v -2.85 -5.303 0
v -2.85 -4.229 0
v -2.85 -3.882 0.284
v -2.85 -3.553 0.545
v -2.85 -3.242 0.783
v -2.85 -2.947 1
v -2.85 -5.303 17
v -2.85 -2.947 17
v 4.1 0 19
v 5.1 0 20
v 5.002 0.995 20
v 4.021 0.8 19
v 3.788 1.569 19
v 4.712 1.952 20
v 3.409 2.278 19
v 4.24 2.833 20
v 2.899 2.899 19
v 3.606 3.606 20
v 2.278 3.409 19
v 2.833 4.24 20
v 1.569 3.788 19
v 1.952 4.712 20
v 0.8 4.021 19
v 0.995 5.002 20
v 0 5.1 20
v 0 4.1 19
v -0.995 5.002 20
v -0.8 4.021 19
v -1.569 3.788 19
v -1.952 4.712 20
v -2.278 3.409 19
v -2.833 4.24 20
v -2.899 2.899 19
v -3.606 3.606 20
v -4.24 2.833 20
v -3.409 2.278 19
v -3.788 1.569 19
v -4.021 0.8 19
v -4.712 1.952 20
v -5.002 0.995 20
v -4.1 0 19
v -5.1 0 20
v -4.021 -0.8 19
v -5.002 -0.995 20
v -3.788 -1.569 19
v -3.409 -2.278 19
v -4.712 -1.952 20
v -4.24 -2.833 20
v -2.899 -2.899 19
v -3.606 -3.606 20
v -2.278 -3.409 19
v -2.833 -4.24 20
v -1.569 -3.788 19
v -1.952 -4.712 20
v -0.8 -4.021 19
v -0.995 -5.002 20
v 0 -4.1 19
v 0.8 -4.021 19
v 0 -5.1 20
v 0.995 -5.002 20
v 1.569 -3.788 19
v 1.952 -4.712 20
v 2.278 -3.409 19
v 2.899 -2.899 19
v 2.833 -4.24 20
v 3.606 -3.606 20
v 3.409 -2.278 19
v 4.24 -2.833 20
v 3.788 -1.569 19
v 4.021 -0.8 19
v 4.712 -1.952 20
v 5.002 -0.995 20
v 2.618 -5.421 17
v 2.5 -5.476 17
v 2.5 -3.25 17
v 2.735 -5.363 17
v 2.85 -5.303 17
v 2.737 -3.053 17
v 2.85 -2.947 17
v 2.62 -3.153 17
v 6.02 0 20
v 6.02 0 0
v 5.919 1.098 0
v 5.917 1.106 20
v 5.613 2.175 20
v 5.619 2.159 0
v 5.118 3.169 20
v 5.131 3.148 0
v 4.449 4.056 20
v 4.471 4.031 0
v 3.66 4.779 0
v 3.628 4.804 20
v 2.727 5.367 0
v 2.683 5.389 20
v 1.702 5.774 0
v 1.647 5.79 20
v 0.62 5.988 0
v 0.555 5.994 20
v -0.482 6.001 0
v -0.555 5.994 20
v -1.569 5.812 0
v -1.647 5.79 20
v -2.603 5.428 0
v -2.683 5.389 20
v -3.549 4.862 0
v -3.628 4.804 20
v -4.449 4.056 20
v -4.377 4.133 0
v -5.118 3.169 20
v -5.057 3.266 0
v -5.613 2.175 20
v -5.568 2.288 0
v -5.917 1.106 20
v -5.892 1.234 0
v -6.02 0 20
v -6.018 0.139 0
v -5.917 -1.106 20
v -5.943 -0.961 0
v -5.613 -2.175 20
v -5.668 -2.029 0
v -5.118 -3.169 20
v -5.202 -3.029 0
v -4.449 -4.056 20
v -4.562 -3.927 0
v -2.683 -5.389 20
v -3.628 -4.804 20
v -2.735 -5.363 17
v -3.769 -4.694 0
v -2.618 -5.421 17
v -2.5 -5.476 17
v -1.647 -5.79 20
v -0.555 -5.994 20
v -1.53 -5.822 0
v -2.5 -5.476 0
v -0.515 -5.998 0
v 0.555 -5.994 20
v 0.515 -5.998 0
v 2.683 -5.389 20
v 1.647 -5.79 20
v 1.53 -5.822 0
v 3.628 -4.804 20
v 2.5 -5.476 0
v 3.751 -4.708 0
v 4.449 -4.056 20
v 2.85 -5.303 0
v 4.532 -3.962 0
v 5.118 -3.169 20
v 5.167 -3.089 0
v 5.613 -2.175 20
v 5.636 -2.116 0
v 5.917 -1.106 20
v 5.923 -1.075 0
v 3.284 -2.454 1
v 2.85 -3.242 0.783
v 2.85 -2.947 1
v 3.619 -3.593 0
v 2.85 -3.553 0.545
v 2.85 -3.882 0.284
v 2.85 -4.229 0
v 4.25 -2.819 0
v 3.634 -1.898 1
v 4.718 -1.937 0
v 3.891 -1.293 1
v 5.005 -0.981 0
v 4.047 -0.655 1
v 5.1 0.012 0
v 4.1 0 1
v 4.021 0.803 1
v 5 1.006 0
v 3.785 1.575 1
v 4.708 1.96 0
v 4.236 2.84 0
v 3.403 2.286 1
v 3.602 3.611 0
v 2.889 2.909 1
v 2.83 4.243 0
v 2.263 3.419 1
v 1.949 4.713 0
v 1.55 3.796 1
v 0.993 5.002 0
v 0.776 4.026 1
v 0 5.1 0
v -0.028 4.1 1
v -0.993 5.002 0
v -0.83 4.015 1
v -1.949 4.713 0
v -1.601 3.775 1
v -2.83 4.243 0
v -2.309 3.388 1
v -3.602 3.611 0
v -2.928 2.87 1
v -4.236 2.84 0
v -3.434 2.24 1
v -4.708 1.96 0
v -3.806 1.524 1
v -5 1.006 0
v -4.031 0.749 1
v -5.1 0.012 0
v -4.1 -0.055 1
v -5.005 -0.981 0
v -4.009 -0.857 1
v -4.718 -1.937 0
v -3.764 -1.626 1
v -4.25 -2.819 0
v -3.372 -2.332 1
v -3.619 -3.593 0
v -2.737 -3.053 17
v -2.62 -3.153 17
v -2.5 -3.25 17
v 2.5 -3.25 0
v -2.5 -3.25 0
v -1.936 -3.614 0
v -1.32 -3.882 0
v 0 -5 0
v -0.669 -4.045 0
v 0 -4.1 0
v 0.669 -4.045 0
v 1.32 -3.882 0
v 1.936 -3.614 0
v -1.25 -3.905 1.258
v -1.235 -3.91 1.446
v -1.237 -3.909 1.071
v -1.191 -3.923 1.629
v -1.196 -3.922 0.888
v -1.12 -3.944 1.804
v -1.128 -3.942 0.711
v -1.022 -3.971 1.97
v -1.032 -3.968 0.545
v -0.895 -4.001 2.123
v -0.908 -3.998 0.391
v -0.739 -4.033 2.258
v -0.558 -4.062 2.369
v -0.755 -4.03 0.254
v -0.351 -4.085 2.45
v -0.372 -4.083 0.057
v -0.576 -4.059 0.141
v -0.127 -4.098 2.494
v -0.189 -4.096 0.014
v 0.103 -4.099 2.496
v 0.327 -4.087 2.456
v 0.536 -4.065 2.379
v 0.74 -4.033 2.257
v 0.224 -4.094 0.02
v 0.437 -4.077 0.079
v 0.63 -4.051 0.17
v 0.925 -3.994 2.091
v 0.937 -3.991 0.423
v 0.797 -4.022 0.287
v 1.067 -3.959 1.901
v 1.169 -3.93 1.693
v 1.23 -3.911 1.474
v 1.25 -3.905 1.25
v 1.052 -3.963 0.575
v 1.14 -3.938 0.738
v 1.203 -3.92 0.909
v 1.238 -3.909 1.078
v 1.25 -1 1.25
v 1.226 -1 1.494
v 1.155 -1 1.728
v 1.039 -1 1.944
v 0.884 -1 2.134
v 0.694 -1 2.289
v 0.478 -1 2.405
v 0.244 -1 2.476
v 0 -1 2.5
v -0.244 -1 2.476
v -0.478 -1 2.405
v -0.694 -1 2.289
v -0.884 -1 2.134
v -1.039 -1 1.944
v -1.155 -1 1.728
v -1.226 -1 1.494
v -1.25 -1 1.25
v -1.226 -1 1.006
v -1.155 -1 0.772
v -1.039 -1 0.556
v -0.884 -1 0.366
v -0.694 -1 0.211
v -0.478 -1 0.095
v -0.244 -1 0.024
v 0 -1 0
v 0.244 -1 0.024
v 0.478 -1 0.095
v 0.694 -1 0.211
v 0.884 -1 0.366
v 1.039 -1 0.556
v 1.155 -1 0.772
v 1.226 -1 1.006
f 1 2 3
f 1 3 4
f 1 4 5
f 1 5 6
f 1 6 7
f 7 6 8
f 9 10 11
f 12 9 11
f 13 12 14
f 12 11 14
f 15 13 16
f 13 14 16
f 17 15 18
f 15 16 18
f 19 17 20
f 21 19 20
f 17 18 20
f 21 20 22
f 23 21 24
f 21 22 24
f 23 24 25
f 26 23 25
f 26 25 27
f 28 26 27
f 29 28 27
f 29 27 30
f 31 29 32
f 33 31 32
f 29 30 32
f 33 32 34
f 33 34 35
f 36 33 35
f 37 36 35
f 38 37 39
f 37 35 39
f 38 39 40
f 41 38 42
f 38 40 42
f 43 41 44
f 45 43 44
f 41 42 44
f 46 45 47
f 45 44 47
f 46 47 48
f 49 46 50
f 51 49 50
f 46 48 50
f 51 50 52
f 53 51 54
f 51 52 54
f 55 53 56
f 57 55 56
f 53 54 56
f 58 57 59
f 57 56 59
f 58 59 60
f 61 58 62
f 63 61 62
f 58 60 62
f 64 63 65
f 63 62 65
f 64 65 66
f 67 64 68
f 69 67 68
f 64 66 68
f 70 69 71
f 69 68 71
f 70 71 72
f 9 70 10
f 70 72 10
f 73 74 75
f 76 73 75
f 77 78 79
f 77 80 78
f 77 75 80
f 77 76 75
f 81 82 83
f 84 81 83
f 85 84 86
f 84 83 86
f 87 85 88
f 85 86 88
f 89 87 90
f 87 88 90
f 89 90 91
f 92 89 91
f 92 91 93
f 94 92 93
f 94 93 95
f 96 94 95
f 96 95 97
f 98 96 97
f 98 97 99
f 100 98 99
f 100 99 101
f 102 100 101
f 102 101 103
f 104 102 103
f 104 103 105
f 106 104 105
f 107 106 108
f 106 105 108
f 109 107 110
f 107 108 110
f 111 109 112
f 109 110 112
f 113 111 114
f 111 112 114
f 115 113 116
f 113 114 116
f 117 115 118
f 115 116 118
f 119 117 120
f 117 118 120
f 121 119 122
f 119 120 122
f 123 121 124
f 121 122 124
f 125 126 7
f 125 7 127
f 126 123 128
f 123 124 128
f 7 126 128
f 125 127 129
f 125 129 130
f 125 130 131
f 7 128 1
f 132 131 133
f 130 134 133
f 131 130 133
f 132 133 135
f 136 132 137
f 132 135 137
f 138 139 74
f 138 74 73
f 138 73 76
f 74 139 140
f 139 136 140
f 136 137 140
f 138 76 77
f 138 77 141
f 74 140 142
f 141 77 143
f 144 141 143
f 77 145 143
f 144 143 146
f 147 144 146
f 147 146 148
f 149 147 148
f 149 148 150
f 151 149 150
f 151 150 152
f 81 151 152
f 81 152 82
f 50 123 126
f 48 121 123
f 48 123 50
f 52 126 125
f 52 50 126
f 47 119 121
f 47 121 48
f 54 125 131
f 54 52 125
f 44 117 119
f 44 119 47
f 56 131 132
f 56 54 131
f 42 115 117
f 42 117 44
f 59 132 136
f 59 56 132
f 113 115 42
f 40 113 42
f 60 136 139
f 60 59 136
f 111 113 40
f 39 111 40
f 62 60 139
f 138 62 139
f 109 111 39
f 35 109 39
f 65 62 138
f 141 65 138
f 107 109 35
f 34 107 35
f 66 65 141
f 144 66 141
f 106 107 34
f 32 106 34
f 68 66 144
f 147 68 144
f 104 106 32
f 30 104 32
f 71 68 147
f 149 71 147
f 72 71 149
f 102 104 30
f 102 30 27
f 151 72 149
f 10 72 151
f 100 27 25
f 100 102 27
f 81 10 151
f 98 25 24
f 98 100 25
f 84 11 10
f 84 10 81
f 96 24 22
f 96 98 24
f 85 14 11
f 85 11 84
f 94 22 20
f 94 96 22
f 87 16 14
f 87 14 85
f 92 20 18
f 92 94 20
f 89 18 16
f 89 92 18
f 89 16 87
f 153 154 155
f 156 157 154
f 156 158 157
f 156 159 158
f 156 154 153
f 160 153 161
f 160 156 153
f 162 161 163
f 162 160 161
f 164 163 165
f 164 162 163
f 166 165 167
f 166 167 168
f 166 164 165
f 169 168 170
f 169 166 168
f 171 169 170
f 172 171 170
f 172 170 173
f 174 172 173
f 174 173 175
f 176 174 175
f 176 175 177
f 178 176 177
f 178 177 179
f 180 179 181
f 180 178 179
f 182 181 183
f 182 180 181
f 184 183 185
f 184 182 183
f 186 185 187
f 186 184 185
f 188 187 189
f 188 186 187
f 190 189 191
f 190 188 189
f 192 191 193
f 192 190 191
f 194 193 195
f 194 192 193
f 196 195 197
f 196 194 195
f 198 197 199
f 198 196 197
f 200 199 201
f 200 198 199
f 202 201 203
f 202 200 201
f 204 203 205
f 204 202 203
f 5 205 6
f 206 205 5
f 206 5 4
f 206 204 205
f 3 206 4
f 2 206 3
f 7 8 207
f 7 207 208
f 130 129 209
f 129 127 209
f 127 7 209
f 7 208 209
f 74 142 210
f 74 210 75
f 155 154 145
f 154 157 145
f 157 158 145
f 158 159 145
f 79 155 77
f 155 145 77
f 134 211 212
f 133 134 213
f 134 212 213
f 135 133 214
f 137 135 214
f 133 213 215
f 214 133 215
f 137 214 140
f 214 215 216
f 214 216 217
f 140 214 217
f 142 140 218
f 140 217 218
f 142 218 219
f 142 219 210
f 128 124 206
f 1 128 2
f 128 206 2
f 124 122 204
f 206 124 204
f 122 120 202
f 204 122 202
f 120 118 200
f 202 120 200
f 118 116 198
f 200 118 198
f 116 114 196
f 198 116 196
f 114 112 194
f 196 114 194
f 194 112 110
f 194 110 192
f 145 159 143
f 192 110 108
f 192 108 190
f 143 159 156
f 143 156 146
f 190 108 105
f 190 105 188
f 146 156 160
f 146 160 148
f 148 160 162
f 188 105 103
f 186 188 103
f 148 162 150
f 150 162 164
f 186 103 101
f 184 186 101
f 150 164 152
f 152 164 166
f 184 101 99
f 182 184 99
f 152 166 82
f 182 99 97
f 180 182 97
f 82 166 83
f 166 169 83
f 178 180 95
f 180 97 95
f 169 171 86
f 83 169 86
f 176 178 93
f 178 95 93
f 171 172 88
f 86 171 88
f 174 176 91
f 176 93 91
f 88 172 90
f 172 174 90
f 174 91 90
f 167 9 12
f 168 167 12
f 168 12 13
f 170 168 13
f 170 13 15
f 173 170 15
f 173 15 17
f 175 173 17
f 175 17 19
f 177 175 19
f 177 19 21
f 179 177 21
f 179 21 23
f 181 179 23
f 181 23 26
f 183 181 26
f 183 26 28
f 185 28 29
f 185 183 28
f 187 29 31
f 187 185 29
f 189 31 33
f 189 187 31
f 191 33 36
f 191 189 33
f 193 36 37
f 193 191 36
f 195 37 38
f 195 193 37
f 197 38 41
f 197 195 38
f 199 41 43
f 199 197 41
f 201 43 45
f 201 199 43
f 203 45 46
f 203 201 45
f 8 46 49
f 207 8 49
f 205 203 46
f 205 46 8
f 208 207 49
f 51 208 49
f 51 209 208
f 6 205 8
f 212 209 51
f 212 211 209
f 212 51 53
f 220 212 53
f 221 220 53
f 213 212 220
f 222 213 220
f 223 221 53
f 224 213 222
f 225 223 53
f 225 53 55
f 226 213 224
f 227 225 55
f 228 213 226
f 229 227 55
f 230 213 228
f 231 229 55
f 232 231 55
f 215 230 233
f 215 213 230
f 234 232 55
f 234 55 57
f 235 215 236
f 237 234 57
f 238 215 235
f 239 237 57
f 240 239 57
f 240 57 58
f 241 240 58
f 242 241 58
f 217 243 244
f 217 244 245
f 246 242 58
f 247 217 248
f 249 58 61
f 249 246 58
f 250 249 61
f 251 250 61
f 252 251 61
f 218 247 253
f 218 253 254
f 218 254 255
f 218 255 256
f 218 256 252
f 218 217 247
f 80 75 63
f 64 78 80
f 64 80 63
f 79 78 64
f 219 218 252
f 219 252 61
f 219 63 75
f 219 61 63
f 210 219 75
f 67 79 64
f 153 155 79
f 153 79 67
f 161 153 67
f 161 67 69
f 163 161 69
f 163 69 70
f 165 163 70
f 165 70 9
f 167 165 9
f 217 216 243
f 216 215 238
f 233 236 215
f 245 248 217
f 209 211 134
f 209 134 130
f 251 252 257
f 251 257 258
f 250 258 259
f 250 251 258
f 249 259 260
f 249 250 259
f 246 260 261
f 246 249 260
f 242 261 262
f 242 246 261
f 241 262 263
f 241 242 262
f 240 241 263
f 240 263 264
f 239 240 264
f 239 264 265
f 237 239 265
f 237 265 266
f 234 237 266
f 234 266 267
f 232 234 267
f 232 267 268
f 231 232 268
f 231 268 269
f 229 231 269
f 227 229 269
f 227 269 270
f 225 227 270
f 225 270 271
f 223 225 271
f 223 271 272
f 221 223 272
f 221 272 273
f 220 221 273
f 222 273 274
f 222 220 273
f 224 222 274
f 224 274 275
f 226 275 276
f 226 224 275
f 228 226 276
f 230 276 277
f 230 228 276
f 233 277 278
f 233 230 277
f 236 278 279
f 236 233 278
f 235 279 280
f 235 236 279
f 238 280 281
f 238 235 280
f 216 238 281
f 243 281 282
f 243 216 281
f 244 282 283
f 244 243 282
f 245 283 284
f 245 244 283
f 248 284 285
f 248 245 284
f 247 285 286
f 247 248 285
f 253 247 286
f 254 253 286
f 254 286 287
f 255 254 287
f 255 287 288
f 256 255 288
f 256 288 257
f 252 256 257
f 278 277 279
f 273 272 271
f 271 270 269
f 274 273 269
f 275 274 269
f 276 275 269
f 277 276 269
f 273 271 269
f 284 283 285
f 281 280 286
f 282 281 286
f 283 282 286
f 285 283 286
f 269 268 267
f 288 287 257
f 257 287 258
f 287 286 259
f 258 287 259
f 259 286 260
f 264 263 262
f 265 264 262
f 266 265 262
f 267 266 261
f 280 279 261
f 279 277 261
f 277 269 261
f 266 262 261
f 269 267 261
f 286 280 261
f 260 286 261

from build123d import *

# Parameters (mm, degrees)
F0_R     = 6.02
F0_R_2   = 4.1
F1_DEPTH = 20
F3_R     = 1.25
F4_DEPTH = 4
F5_W     = 0.35
F5_H     = 17
F6_DEPTH = 2.5
F7_SIZE  = 1


with BuildPart() as f1:
    # F0 (on Top) → F1 (new body)
    with BuildSketch(Plane.XY):
        Circle(F0_R)
        Circle(F0_R_2, mode=Mode.SUBTRACT)
    extrude(amount=F1_DEPTH)

    # F3 (on offset) → F4 (join)
    with BuildSketch(Plane.XZ.offset(5)):
        with Locations((0, 1.25)):
            Circle(F3_R)
    extrude(amount=-F4_DEPTH)

    # F5 (on offset) → F6 (cut, symmetric)
    with BuildSketch(Plane.XZ.offset(5)):
        with Locations((-2.675, 8.5)):
            Rectangle(F5_W, F5_H)
        with Locations((2.675, 8.5)):
            Rectangle(F5_W, F5_H)
    extrude(amount=F6_DEPTH, both=True, mode=Mode.SUBTRACT)

    # F7
    f7_edges = [f1.edges().sort_by_distance(p)[0] for p in [
        (-4.1, 0, 20),
        (-1.600781, 3.774586, 0),
    ]]
    chamfer(f7_edges, length=F7_SIZE)


solid = f1.part
